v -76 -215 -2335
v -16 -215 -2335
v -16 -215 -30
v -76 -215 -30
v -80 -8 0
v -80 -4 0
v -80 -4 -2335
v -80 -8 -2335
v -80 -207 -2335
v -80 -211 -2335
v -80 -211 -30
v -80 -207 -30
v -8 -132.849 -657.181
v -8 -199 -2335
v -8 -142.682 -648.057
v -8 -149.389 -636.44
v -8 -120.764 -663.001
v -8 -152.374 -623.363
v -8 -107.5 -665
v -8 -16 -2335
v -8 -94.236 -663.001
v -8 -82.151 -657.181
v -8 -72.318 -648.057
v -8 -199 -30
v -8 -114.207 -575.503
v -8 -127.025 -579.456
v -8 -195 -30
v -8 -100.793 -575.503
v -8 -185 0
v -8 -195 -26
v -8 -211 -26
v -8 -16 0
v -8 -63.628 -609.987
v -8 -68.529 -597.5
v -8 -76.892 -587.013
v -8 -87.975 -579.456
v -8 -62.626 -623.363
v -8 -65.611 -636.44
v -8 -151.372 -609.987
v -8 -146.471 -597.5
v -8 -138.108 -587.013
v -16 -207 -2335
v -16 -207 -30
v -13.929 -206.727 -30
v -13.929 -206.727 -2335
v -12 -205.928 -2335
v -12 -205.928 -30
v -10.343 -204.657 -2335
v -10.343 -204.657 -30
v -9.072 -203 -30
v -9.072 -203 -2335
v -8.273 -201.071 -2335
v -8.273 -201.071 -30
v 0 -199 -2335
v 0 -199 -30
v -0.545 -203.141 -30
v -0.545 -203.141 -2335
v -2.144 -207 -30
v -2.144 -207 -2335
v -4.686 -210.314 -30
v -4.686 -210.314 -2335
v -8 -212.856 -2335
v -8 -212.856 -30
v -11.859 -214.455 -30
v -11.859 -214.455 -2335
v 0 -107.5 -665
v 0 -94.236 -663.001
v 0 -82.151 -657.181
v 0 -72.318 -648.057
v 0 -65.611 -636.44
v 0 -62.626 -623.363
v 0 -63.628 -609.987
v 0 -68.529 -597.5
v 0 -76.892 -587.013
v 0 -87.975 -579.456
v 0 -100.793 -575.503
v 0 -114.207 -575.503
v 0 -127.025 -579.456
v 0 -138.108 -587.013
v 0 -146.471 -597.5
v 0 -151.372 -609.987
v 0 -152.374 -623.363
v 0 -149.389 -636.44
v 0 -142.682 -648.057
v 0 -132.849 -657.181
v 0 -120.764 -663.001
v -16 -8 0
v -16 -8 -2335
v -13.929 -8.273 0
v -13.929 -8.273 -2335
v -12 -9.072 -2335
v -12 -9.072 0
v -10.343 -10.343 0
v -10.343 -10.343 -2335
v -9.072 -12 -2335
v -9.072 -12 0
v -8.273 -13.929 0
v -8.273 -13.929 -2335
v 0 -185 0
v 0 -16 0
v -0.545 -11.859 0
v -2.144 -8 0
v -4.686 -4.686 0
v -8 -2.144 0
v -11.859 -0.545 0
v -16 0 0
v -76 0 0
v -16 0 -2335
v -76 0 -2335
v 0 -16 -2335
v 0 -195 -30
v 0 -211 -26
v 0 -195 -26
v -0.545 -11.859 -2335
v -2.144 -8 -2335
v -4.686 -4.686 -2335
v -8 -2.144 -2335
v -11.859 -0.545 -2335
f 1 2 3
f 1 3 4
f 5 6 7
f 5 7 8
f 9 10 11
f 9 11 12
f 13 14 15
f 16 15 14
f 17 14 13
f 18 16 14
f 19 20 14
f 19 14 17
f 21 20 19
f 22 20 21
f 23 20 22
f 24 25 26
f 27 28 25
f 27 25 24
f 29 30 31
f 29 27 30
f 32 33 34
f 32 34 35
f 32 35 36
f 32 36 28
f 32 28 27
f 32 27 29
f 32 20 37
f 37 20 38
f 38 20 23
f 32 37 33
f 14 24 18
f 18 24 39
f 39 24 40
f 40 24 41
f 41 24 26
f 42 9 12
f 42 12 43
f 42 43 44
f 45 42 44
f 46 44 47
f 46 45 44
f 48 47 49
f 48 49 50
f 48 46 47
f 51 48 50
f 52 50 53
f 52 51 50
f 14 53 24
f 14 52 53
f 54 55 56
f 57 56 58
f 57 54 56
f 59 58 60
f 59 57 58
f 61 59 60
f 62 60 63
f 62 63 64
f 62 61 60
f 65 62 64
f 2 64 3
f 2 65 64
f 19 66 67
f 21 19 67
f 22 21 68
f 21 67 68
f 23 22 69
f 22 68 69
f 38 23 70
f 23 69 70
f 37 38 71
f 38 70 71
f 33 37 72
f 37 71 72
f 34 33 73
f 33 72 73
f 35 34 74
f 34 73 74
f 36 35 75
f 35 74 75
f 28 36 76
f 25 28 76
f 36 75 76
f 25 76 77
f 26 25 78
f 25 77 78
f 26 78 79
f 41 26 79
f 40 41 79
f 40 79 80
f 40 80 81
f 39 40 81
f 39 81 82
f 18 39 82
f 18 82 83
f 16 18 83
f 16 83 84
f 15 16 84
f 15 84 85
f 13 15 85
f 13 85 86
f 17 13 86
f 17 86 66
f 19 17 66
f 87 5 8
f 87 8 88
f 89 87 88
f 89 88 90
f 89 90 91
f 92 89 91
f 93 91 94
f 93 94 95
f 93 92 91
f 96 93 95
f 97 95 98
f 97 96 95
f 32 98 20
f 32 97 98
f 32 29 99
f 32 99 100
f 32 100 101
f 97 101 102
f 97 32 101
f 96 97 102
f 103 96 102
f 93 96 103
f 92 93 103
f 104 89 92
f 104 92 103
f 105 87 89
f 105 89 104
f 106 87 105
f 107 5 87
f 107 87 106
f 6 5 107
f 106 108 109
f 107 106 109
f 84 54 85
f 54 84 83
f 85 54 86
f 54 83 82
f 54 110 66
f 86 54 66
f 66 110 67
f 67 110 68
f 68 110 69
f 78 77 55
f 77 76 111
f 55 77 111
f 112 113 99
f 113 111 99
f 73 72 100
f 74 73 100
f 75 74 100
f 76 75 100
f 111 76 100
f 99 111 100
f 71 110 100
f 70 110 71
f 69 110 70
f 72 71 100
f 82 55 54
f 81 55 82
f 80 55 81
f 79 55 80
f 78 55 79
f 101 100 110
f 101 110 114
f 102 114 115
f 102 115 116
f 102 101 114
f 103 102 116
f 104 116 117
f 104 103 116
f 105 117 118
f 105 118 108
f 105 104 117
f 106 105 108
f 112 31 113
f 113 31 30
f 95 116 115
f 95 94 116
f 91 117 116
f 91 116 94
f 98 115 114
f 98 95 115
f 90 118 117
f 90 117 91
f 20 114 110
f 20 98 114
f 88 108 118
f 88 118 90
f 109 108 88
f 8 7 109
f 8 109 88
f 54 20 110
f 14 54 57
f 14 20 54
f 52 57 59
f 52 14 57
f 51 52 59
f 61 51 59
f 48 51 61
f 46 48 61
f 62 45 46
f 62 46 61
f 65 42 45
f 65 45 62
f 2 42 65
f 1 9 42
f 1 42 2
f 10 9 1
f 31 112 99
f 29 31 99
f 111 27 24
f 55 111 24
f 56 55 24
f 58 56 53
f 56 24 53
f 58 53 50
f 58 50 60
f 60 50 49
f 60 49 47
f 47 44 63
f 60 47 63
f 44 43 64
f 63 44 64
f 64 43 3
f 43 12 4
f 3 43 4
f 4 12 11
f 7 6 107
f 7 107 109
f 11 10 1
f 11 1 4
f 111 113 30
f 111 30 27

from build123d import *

# Parameters (mm, degrees)
SM_BASE_FLANGE_1_DEPTH             = 8
SM_EDGE_FLANGE_1_STRIP_W           = 48
SM_EDGE_FLANGE_1_STRIP_H           = 8
SM_EDGE_FLANGE_1_STRIP_CUT_DEPTH   = 2335
SM_EDGE_FLANGE_1_STRIP_2_W         = 48
SM_EDGE_FLANGE_1_STRIP_2_H         = 8
SM_EDGE_FLANGE_1_STRIP_CUT_2_DEPTH = 2305
SM_EDGE_FLANGE_1_RELIEF_W          = 52
SM_EDGE_FLANGE_1_RELIEF_H          = 4
SM_EDGE_FLANGE_1_RELIEF_CUT_DEPTH  = 8
SM_EDGE_FLANGE_1_DEPTH             = 2335
SM_EDGE_FLANGE_1_BEND_DEPTH        = 2305
CHAMFER_1_SIZE                     = 4
SKETCH_12_R                        = 45
CUT_EXTRUDE_1_DEPTH                = 2347.241675531


# Sheet-metal steps are written as plain solids
with BuildPart() as part:
    # Sketch 1 → 基体-法兰1 (new body)
    with BuildSketch(Plane(origin=(0, 0, 0), x_dir=(0, 0, -1), z_dir=(1, 0, 0))):
        Polygon((0, 0), (2335, 0), (2335, -215), (30, -215), (0, -185), align=None)
    extrude(amount=-SM_BASE_FLANGE_1_DEPTH)

    # 边线-法兰1 strip (across the edge) → 边线-法兰1 strip cut (cut)
    with BuildSketch(Plane(origin=(-8, 0, 0), x_dir=(0, -1, 0), z_dir=(0, 0, -1))):
        with Locations((-8, -4)):
            Rectangle(SM_EDGE_FLANGE_1_STRIP_W, SM_EDGE_FLANGE_1_STRIP_H)
    extrude(amount=SM_EDGE_FLANGE_1_STRIP_CUT_DEPTH, mode=Mode.SUBTRACT)

    # 边线-法兰1 strip 2 (across the edge) → 边线-法兰1 strip cut 2 (cut)
    with BuildSketch(Plane(origin=(-8, -215, -2335), x_dir=(0, 1, 0), z_dir=(0, 0, 1))):
        with Locations((-8, -4)):
            Rectangle(SM_EDGE_FLANGE_1_STRIP_2_W, SM_EDGE_FLANGE_1_STRIP_2_H)
    extrude(amount=SM_EDGE_FLANGE_1_STRIP_CUT_2_DEPTH, mode=Mode.SUBTRACT)

    # 边线-法兰1 relief (on the sheet) → 边线-法兰1 relief cut (cut)
    with BuildSketch(Plane(origin=(-8, -199, -2335), x_dir=(0, 1, 0), z_dir=(-1, 0, 0))):
        with Locations((-22, -2307)):
            Rectangle(SM_EDGE_FLANGE_1_RELIEF_W, SM_EDGE_FLANGE_1_RELIEF_H)
    extrude(amount=-SM_EDGE_FLANGE_1_RELIEF_CUT_DEPTH, mode=Mode.SUBTRACT)

    # 边线-法兰1 section (across the edge) → 边线-法兰1 (add)
    with BuildSketch(Plane(origin=(-8, 0, 0), x_dir=(0, -1, 0), z_dir=(0, 0, -1))):
        with BuildLine():
            Line((0, 8), (0, 72))
            Line((0, 72), (8, 72))
            Line((8, 72), (8, 8))
            ThreePointArc((8, 8), (10.343145751, 2.343145751), (16, 0))
            Line((16, 0), (16, -8))
            ThreePointArc((16, -8), (4.686291501, -3.313708499), (0, 8))
        make_face()
    extrude(amount=SM_EDGE_FLANGE_1_DEPTH)

    # 边线-法兰1 section 2 (across the edge) → 边线-法兰1 bend (add)
    with BuildSketch(Plane(origin=(-8, -215, -2335), x_dir=(0, 1, 0), z_dir=(0, 0, 1))):
        with BuildLine():
            Line((0, 8), (0, 72))
            Line((0, 72), (8, 72))
            Line((8, 72), (8, 8))
            ThreePointArc((8, 8), (10.343145751, 2.343145751), (16, 0))
            Line((16, 0), (16, -8))
            ThreePointArc((16, -8), (4.686291501, -3.313708499), (0, 8))
        make_face()
    extrude(amount=SM_EDGE_FLANGE_1_BEND_DEPTH)

    # 倒角1
    chamfer_1_edges = [part.edges().sort_by_distance(p)[0] for p in [
        (-80, 0, -1167.5),
        (-80, -215, -1182.5),
    ]]
    chamfer(chamfer_1_edges, length=CHAMFER_1_SIZE)

    # 草图12 → 切除-拉伸1 (cut, through all)
    with BuildSketch(Plane(origin=(0, 0, 0), x_dir=(0, 0, -1), z_dir=(1, 0, 0))):
        with Locations((620, -107.5)):
            Circle(SKETCH_12_R)
    extrude(amount=-CUT_EXTRUDE_1_DEPTH, mode=Mode.SUBTRACT)


solid = part.part
